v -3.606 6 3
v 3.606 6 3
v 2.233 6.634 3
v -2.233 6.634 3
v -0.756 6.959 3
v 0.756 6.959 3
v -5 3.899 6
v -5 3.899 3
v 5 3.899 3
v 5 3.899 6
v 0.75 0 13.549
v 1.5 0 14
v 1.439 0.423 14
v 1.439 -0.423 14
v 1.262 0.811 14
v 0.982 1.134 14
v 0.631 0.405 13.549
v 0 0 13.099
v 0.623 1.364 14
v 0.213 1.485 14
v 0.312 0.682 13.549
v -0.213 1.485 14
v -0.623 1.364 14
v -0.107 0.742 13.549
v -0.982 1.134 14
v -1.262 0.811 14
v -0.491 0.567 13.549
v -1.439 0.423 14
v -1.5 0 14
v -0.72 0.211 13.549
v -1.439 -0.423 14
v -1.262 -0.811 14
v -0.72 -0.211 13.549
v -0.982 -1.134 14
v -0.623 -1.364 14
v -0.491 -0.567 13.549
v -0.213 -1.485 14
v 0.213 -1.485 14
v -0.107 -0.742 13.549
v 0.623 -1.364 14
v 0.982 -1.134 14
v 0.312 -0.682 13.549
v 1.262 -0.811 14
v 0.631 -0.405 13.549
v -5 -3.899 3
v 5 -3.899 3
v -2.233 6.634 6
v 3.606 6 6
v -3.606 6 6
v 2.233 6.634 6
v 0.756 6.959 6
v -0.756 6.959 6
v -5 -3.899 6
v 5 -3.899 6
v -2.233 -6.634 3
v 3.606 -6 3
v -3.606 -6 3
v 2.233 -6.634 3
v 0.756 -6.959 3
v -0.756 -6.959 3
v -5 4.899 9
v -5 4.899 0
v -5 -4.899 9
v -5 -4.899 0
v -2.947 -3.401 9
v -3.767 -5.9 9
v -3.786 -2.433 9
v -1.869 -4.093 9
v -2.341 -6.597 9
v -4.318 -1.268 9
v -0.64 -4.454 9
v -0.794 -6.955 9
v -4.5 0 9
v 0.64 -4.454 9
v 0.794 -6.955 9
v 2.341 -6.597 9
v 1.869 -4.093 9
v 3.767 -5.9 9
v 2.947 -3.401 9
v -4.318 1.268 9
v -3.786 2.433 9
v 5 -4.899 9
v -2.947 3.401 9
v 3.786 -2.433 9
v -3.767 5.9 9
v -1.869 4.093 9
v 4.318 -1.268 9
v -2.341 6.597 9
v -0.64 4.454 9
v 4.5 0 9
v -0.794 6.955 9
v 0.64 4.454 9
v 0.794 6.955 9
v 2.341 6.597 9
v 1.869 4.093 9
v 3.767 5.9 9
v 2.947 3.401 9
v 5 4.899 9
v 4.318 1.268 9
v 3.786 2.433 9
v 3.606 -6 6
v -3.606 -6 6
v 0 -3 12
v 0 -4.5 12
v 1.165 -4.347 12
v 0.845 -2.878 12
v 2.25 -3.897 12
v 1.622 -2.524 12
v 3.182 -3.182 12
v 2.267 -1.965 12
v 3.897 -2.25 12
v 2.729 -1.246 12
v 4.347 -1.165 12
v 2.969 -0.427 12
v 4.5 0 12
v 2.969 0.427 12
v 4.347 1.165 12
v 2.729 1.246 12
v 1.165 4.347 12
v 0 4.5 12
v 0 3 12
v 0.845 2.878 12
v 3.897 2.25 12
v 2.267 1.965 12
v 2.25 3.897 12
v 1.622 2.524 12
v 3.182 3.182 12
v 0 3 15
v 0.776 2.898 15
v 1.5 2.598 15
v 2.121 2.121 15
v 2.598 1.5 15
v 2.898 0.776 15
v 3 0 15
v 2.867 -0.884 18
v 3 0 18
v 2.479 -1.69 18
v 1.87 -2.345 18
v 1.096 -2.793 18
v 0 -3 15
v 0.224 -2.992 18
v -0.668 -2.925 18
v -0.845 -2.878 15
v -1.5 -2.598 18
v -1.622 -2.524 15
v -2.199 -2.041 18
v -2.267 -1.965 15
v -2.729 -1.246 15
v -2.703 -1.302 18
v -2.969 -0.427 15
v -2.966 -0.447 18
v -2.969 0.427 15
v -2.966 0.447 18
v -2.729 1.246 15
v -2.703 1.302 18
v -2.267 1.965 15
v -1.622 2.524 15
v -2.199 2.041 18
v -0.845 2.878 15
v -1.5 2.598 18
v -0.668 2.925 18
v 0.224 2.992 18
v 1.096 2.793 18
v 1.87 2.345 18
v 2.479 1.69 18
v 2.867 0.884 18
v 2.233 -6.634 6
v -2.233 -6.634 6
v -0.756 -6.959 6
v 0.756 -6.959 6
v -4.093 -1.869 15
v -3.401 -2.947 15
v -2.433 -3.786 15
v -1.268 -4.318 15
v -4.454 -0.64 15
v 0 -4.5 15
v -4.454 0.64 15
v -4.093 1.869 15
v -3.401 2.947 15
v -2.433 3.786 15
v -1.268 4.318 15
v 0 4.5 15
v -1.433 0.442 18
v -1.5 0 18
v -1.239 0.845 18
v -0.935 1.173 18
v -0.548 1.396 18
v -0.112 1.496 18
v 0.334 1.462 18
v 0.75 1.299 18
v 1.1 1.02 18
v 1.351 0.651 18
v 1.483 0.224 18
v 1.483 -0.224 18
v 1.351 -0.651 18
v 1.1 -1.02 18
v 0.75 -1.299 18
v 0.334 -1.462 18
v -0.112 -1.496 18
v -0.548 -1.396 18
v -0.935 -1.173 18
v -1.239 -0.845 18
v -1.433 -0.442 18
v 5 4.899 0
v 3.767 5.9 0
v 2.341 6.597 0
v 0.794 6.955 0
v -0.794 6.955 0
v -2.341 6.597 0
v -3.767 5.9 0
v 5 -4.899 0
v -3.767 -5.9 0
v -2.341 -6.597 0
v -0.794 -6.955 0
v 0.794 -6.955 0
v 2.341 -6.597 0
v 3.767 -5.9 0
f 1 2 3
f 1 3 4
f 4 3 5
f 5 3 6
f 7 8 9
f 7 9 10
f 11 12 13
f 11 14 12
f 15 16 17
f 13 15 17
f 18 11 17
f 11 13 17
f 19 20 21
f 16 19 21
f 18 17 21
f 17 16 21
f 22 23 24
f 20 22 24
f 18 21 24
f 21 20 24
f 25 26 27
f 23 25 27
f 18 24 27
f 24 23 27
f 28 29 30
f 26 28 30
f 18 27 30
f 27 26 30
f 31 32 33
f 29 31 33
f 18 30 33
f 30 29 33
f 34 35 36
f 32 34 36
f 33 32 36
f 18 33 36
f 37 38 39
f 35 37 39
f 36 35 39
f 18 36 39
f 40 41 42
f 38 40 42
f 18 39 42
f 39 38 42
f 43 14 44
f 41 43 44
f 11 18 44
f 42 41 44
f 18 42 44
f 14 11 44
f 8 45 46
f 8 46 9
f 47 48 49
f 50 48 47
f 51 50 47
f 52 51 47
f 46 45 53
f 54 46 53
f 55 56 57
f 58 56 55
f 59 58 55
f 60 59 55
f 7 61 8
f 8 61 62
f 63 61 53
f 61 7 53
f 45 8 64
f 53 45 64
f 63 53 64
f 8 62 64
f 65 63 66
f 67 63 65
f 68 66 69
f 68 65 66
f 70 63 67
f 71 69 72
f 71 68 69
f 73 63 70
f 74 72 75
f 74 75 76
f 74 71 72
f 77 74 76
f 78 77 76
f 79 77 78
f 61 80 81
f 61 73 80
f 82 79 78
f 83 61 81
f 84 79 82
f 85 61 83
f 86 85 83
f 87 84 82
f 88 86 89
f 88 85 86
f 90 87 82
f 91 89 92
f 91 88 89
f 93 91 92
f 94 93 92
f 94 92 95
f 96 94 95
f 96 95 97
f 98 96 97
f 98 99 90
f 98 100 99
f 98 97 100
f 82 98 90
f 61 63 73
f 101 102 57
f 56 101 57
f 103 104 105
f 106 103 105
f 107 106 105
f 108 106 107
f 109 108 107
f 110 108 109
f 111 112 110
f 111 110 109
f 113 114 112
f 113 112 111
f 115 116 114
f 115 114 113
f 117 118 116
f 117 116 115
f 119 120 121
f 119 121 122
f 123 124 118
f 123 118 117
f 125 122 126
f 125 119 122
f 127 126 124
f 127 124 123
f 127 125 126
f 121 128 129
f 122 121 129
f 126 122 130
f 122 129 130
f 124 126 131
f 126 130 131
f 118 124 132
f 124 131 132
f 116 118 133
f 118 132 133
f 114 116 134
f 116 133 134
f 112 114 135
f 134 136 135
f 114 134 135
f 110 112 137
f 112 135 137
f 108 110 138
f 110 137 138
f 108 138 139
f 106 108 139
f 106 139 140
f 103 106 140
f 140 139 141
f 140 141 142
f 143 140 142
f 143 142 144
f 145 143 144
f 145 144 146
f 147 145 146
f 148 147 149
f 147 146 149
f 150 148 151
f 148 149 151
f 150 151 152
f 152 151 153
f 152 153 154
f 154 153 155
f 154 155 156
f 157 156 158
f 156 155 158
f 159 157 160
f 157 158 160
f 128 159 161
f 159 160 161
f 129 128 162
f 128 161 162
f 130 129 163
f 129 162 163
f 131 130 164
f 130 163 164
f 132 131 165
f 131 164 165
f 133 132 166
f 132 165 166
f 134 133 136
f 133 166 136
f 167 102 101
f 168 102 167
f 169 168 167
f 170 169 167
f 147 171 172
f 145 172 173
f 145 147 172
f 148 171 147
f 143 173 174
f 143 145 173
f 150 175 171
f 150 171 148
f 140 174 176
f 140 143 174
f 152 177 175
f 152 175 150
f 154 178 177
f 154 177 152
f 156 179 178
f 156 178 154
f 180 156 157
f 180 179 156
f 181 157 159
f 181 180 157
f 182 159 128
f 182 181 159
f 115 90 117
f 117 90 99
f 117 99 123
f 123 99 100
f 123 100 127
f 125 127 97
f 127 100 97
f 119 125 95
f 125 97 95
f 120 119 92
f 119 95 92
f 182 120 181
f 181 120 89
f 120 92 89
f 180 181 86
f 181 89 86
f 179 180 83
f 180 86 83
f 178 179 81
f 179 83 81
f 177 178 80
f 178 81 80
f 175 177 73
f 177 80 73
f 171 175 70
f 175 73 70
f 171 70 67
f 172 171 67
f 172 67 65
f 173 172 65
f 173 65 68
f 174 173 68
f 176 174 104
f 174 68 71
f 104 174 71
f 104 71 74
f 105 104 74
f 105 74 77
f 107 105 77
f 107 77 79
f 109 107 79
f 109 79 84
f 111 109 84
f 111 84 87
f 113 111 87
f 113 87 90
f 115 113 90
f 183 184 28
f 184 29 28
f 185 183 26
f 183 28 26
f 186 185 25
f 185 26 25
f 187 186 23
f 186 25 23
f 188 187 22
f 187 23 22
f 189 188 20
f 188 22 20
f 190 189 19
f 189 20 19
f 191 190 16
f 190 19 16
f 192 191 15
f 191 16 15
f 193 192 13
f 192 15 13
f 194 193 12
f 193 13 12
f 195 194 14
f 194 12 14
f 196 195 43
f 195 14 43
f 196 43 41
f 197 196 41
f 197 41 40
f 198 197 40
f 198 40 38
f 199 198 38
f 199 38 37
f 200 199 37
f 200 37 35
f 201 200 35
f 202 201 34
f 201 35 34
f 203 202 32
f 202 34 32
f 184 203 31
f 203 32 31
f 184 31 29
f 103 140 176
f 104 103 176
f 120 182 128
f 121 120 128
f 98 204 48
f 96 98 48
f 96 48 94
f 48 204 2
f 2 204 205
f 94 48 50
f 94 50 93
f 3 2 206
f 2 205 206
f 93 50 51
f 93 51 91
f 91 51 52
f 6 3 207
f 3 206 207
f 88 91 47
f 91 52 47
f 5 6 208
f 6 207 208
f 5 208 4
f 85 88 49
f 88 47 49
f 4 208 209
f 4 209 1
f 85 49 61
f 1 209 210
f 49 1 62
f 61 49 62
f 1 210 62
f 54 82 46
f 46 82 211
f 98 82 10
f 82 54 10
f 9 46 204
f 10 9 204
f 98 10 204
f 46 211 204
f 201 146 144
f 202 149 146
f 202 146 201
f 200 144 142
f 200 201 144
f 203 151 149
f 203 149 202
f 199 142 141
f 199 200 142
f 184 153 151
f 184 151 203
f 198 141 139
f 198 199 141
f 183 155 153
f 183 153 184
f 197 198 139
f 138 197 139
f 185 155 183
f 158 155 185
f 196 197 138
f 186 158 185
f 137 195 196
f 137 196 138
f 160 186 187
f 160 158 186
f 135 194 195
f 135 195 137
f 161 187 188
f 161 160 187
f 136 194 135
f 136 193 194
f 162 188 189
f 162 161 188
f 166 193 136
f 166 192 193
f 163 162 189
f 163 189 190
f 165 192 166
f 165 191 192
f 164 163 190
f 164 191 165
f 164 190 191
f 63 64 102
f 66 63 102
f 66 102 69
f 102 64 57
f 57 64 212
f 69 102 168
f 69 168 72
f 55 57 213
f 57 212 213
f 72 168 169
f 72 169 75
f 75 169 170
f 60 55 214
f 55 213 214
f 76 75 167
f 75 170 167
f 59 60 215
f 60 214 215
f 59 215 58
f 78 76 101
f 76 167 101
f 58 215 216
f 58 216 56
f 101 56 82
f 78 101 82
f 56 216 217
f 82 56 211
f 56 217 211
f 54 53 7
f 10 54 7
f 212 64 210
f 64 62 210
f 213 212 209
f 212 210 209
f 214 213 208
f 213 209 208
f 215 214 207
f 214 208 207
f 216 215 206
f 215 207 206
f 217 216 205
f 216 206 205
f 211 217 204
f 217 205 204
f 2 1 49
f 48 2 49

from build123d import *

# Parameters (mm, degrees)
BOSS_EXTRUDE1_DEPTH       = 9
SKETCH2_W                 = 3
SKETCH2_H                 = 1
SKETCH2_H_2               = 7.797958972
CUT_EXTRUDE1_DEPTH        = 19
SKETCH3_R                 = 4.5
BOSS_EXTRUDE2_DEPTH       = 6
SKETCH4_R                 = 3
BOSS_EXTRUDE3_DEPTH       = 3
F_3_0MM_DOWEL_HOLE1_D     = 3
F_3_0MM_DOWEL_HOLE1_DEPTH = 4
F_3_0MM_DOWEL_HOLE1_TIP   = 0.901290929
CUT_EXTRUDE2_DEPTH        = 3


with BuildPart() as part:
    # Sketch1 → Boss-Extrude1 (new body)
    with BuildSketch(Plane.XY):
        with BuildLine():
            ThreePointArc((-5, -4.898979486), (0, -7), (5, -4.898979486))
            Line((5, -4.898979486), (5, 4.898979486))
            ThreePointArc((5, 4.898979486), (0, 7), (-5, 4.898979486))
            Line((-5, 4.898979486), (-5, -4.898979486))
        make_face()
    extrude(amount=BOSS_EXTRUDE1_DEPTH)

    # Sketch2 → Cut-Extrude1 (cut)
    with BuildSketch(Plane.ZY.offset(5)):
        with Locations((4.5, 6.5)):
            Rectangle(SKETCH2_W, SKETCH2_H)
        with Locations((4.5, 0)):
            Rectangle(SKETCH2_W, SKETCH2_H_2)
        Polygon((3, -7), (3.352176654, -7), (6, -7), (6, -6), (3, -6), align=None)
    extrude(amount=-CUT_EXTRUDE1_DEPTH, mode=Mode.SUBTRACT)

    # Sketch3 → Boss-Extrude2 (add)
    with BuildSketch(Plane.XY.offset(9)):
        Circle(SKETCH3_R)
    extrude(amount=BOSS_EXTRUDE2_DEPTH)

    # Sketch4 → Boss-Extrude3 (add)
    with BuildSketch(Plane.XY.offset(15)):
        Circle(SKETCH4_R)
    extrude(amount=BOSS_EXTRUDE3_DEPTH)

    # Ø3.0mm Dowel Hole1
    with Locations(Plane.XY.offset(18)):
        with Locations((0, 0)):
            Hole(F_3_0MM_DOWEL_HOLE1_D / 2, depth=F_3_0MM_DOWEL_HOLE1_DEPTH)
            with Locations((0, 0, -(F_3_0MM_DOWEL_HOLE1_DEPTH + F_3_0MM_DOWEL_HOLE1_TIP / 2))):  # 118° drill point
                Cone(0, F_3_0MM_DOWEL_HOLE1_D / 2, F_3_0MM_DOWEL_HOLE1_TIP, mode=Mode.SUBTRACT)

    # Sketch9 → Cut-Extrude2 (cut)
    with BuildSketch(Plane.XY.offset(15)):
        with BuildLine():
            Line((0, 4.5), (0, 3))
            ThreePointArc((0, 3), (3, 0), (0, -3))
            Line((0, -3), (0, -4.5))
            ThreePointArc((0, -4.5), (4.5, 0), (0, 4.5))
        make_face()
    extrude(amount=-CUT_EXTRUDE2_DEPTH, mode=Mode.SUBTRACT)


solid = part.part
